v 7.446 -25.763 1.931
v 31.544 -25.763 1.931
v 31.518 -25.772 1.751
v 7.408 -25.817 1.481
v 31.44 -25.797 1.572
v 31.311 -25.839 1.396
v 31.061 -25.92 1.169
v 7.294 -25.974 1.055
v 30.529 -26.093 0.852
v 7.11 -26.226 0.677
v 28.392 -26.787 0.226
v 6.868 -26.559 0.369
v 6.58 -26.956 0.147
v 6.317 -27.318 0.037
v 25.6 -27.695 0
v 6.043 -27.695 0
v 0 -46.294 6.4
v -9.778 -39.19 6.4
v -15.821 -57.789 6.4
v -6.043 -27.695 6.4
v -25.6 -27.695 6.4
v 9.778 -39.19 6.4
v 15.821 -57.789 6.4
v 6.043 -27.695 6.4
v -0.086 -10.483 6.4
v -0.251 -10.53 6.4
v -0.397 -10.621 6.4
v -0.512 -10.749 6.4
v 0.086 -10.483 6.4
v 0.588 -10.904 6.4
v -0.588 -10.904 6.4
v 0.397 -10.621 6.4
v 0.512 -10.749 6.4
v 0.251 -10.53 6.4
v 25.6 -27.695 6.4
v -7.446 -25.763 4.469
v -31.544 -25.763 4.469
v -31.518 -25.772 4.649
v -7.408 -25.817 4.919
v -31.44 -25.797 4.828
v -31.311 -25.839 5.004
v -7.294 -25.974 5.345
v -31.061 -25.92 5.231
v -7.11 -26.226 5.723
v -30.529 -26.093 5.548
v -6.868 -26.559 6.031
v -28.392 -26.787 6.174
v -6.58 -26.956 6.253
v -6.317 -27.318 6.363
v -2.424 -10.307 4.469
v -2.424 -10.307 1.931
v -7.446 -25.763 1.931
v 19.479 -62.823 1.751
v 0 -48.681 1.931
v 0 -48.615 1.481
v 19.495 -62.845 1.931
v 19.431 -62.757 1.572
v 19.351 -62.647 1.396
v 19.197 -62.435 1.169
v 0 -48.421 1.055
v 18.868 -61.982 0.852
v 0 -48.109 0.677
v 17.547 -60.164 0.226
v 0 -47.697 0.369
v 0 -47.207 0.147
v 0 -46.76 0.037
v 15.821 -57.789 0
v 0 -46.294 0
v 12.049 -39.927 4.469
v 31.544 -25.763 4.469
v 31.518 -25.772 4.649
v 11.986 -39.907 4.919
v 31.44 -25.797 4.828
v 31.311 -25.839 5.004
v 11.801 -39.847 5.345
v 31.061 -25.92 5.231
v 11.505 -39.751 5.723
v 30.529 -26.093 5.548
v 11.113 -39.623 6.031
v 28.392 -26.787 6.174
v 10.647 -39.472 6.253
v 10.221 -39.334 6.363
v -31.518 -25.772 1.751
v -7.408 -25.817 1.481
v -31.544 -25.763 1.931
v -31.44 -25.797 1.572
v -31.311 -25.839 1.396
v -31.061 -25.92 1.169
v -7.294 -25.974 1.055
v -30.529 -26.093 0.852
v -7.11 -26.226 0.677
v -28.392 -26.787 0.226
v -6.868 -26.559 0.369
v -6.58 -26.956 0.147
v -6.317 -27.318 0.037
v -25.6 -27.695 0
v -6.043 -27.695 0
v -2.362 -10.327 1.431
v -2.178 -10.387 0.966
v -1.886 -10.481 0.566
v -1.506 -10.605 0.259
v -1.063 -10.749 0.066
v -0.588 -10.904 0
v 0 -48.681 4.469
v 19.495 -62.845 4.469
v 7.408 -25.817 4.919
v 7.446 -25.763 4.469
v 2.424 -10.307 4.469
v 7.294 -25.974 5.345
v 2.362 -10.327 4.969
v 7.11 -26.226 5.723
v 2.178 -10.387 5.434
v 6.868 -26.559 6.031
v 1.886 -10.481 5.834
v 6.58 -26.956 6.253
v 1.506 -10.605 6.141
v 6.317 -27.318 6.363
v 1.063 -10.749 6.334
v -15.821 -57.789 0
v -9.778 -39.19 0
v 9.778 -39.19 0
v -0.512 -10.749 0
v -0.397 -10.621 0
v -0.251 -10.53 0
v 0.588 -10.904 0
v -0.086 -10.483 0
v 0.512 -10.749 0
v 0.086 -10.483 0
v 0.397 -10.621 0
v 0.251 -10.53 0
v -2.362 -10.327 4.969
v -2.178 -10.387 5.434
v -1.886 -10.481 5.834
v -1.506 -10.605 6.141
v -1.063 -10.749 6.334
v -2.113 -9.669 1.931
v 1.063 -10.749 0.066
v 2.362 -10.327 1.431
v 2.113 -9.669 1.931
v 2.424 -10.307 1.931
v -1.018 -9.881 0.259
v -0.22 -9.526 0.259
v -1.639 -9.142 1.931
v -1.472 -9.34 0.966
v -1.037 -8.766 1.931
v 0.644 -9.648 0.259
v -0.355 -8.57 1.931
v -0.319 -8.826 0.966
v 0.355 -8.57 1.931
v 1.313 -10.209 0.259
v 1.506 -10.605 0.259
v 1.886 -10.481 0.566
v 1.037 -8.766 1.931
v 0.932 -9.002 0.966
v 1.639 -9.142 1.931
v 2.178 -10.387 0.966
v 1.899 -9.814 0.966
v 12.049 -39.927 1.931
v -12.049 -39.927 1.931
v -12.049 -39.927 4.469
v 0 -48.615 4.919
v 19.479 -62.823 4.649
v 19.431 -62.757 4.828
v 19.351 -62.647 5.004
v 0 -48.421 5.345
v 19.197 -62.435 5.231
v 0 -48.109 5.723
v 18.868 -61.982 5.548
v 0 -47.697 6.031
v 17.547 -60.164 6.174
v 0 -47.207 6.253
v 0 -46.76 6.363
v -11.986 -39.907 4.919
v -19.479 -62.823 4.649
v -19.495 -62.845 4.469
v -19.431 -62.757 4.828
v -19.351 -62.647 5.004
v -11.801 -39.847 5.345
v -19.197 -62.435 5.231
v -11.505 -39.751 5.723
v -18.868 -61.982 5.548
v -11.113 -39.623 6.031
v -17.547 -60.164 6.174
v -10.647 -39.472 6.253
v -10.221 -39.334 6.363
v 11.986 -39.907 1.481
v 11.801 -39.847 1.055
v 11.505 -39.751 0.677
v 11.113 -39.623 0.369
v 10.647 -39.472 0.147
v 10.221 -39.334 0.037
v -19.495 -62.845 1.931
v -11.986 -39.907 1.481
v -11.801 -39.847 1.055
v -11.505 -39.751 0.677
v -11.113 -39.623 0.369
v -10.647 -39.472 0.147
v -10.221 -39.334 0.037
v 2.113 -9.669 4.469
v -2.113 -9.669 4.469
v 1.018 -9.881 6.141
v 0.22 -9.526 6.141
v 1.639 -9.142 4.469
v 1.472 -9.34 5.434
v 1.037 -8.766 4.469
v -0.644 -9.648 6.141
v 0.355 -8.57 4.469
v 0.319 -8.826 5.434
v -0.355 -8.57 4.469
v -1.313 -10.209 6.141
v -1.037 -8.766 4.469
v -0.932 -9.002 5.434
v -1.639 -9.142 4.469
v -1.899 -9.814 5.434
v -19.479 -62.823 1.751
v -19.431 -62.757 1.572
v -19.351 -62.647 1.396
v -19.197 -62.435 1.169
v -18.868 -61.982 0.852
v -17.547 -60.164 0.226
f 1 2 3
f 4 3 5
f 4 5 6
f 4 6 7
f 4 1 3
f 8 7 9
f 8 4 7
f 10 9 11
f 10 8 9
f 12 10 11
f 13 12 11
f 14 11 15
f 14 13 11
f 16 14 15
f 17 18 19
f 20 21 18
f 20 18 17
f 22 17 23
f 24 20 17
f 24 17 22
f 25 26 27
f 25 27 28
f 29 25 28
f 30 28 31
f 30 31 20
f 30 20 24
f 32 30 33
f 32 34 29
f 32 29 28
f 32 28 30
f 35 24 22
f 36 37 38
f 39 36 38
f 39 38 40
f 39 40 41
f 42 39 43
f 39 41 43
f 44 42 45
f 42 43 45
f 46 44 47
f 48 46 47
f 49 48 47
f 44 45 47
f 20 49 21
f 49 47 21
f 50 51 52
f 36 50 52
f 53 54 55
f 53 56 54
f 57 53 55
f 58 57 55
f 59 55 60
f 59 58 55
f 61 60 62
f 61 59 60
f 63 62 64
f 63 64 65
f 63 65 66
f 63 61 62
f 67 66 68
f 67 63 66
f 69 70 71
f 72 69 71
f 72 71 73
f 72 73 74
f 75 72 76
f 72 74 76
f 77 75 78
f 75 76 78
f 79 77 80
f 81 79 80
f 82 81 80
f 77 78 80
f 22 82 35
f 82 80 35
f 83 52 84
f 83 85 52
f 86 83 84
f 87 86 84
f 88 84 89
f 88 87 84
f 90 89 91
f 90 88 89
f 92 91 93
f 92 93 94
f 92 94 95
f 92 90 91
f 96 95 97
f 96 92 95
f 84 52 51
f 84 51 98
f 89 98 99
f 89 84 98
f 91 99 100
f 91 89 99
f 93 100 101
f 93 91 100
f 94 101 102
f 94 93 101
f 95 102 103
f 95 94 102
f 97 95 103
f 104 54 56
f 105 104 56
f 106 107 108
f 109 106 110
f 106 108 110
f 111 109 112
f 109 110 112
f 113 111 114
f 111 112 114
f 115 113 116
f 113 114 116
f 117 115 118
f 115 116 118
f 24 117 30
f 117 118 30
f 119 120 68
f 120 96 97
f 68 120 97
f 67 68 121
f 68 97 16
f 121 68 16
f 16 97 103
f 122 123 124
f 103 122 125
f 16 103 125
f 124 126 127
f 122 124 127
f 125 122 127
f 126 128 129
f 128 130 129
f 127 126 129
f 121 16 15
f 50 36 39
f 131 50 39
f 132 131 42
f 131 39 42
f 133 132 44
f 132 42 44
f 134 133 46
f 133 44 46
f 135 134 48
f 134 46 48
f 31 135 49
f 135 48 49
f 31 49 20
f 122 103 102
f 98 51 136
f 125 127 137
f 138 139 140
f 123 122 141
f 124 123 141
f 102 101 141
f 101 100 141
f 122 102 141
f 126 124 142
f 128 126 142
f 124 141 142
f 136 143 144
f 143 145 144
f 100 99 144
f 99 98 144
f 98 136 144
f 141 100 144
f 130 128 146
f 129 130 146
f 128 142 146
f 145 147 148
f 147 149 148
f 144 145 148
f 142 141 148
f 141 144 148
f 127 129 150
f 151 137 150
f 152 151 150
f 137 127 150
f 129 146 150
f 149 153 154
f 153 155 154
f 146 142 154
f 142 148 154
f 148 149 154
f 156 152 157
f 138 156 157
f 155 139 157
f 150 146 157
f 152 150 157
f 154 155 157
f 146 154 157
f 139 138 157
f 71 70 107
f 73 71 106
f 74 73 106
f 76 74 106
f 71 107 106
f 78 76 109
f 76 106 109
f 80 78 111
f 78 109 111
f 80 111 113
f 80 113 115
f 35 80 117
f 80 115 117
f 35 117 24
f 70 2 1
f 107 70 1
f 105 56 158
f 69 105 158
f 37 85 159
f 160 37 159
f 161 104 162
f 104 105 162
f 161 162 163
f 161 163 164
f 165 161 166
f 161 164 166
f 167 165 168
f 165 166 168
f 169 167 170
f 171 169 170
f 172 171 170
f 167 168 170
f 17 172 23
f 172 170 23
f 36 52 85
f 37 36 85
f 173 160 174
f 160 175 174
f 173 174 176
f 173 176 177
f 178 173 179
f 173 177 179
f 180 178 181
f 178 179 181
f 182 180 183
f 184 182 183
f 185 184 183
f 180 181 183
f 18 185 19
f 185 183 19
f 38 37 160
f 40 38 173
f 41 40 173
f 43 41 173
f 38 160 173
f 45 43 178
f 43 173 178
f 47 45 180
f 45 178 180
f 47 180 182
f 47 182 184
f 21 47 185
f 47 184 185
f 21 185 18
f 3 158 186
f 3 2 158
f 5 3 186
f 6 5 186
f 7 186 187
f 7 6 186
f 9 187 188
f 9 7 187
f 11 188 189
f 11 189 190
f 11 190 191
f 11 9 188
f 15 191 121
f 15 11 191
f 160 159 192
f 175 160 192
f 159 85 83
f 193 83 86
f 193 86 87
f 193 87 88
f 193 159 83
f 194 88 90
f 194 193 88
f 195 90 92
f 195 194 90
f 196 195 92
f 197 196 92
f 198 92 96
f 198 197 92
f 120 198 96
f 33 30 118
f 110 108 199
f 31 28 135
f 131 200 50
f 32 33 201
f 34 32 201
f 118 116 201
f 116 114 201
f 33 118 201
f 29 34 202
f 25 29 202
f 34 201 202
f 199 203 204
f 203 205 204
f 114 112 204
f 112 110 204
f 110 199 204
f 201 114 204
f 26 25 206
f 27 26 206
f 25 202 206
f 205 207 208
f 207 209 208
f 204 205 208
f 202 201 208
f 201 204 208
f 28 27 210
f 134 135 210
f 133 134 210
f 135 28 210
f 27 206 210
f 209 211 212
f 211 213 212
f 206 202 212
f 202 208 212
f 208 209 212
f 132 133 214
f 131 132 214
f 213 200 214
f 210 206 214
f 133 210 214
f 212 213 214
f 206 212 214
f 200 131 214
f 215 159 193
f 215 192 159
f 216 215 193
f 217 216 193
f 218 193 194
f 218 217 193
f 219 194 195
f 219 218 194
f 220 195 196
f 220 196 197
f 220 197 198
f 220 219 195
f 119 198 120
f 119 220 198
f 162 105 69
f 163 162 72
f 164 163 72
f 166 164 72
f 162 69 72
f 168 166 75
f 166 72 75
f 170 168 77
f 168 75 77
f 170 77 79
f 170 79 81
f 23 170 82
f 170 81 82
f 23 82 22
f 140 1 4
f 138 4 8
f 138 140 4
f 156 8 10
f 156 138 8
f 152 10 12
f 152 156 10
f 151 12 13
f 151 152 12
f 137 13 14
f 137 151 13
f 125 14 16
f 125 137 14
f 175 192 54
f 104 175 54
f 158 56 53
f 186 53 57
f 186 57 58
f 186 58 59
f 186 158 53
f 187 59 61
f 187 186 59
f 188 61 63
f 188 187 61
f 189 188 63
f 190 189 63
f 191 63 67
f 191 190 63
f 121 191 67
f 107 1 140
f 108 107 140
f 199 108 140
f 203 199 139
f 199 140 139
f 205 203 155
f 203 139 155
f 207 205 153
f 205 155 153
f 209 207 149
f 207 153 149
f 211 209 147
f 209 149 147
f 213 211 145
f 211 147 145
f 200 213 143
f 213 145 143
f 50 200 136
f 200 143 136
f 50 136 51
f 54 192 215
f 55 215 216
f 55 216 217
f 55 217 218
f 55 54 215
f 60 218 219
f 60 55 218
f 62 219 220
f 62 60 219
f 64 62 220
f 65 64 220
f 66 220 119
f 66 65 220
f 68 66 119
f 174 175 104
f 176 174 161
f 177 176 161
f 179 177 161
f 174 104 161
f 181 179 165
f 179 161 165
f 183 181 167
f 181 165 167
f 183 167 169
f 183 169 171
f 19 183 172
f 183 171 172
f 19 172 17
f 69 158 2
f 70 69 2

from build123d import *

# Parameters (mm, degrees)
F1_DEPTH    = 6.4
F5_R        = 1.9313708499
F6_T1_DEPTH = 6.4
F6_T4_ANGLE = 144
F6_T6_ANGLE = 144


# Not quite as in the source:
# - a fillet or chamfer that OpenCascade refuses, or shapes differently, is made with other operations: its cross-section is extruded or revolved along the edge and cut away or added


with BuildPart() as f1:
    # F0 (on Top) → F1 (new body)
    with BuildSketch(Plane.XY):
        Polygon((-31.5438667271, -25.7632551613), (-12.0486849532, -39.9273338113), (-19.495181774, -62.8452944863), (0, -48.6812158363), (19.495181774, -62.8452944863), (12.0486849532, -39.9273338113), (31.5438667271, -25.7632551613), (7.4464968208, -25.7632551613), (0, -2.8452944863), (-7.4464968208, -25.7632551613), align=None)
    extrude(amount=F1_DEPTH)

    # F5
    f5_edges = [f1.edges().sort_by_distance(p)[0] for p in [
        (-21.796276, -32.845294, 6.4),
        (-15.771933, -51.386314, 6.4),
        (-9.747591, -55.763255, 6.4),
        (9.747591, -55.763255, 6.4),
        (15.771933, -51.386314, 6.4),
        (21.796276, -32.845294, 6.4),
        (19.495182, -25.763255, 6.4),
        (3.723248, -14.304275, 6.4),
        (-3.723248, -14.304275, 6.4),
        (-19.495182, -25.763255, 6.4),
        (-21.796276, -32.845294, 0),
        (-15.771933, -51.386314, 0),
        (-9.747591, -55.763255, 0),
        (9.747591, -55.763255, 0),
        (15.771933, -51.386314, 0),
        (21.796276, -32.845294, 0),
        (19.495182, -25.763255, 0),
        (3.723248, -14.304275, 0),
        (-3.723248, -14.304275, 0),
        (-19.495182, -25.763255, 0),
    ]]
    fillet(f5_edges, radius=F5_R)

    # F6: fillet of radius 2.5491174943 on 1 edges, made by hand

    # F6_s2 → F6_t1 (cut)
    with BuildSketch(Plane.XY):
        with BuildLine():
            ThreePointArc((2.4243548038, -10.3066913542), (0, -8.5452944863), (-2.4243548038, -10.3066913542))
            Line((-2.4243548038, -10.3066913542), (0, -2.8452944863))
            Line((0, -2.8452944863), (2.4243548038, -10.3066913542))
        make_face()
    extrude(amount=F6_T1_DEPTH, mode=Mode.SUBTRACT)

    # F6_s3 → F6_t4 (revolve, cut)
    with BuildSketch(Plane(origin=(-3.2605658725, -10.0349899078, 0), x_dir=(0, 0, 1), z_dir=(-0.3090169944, -0.9510565163, 0))):
        with BuildLine():
            ThreePointArc((0, -2.8106152002), (0.5656854249, -1.4449297752), (1.9313708499, -0.8792443503))
            Line((1.9313708499, -0.8792443503), (0, -0.8792443503))
            Line((0, -0.8792443503), (0, -2.8106152002))
        make_face()
    revolve(axis=Axis((0, -11.0944119806, 0), (0, 0, -1)), revolution_arc=F6_T4_ANGLE, mode=Mode.SUBTRACT)

    # F6_s5 → F6_t6 (revolve, cut)
    with BuildSketch(Plane(origin=(3.2605658725, -10.0349899078, 0), x_dir=(0, 0, 1), z_dir=(0.3090169944, -0.9510565163, 0))):
        with BuildLine():
            ThreePointArc((6.4, 2.8106152002), (5.8343145751, 1.4449297752), (4.4686291501, 0.8792443503))
            Line((4.4686291501, 0.8792443503), (6.4, 0.8792443503))
            Line((6.4, 0.8792443503), (6.4, 2.8106152002))
        make_face()
    revolve(axis=Axis((0, -11.0944119806, 6.4), (0, 0, 1)), revolution_arc=F6_T6_ANGLE, mode=Mode.SUBTRACT)


solid = f1.part
